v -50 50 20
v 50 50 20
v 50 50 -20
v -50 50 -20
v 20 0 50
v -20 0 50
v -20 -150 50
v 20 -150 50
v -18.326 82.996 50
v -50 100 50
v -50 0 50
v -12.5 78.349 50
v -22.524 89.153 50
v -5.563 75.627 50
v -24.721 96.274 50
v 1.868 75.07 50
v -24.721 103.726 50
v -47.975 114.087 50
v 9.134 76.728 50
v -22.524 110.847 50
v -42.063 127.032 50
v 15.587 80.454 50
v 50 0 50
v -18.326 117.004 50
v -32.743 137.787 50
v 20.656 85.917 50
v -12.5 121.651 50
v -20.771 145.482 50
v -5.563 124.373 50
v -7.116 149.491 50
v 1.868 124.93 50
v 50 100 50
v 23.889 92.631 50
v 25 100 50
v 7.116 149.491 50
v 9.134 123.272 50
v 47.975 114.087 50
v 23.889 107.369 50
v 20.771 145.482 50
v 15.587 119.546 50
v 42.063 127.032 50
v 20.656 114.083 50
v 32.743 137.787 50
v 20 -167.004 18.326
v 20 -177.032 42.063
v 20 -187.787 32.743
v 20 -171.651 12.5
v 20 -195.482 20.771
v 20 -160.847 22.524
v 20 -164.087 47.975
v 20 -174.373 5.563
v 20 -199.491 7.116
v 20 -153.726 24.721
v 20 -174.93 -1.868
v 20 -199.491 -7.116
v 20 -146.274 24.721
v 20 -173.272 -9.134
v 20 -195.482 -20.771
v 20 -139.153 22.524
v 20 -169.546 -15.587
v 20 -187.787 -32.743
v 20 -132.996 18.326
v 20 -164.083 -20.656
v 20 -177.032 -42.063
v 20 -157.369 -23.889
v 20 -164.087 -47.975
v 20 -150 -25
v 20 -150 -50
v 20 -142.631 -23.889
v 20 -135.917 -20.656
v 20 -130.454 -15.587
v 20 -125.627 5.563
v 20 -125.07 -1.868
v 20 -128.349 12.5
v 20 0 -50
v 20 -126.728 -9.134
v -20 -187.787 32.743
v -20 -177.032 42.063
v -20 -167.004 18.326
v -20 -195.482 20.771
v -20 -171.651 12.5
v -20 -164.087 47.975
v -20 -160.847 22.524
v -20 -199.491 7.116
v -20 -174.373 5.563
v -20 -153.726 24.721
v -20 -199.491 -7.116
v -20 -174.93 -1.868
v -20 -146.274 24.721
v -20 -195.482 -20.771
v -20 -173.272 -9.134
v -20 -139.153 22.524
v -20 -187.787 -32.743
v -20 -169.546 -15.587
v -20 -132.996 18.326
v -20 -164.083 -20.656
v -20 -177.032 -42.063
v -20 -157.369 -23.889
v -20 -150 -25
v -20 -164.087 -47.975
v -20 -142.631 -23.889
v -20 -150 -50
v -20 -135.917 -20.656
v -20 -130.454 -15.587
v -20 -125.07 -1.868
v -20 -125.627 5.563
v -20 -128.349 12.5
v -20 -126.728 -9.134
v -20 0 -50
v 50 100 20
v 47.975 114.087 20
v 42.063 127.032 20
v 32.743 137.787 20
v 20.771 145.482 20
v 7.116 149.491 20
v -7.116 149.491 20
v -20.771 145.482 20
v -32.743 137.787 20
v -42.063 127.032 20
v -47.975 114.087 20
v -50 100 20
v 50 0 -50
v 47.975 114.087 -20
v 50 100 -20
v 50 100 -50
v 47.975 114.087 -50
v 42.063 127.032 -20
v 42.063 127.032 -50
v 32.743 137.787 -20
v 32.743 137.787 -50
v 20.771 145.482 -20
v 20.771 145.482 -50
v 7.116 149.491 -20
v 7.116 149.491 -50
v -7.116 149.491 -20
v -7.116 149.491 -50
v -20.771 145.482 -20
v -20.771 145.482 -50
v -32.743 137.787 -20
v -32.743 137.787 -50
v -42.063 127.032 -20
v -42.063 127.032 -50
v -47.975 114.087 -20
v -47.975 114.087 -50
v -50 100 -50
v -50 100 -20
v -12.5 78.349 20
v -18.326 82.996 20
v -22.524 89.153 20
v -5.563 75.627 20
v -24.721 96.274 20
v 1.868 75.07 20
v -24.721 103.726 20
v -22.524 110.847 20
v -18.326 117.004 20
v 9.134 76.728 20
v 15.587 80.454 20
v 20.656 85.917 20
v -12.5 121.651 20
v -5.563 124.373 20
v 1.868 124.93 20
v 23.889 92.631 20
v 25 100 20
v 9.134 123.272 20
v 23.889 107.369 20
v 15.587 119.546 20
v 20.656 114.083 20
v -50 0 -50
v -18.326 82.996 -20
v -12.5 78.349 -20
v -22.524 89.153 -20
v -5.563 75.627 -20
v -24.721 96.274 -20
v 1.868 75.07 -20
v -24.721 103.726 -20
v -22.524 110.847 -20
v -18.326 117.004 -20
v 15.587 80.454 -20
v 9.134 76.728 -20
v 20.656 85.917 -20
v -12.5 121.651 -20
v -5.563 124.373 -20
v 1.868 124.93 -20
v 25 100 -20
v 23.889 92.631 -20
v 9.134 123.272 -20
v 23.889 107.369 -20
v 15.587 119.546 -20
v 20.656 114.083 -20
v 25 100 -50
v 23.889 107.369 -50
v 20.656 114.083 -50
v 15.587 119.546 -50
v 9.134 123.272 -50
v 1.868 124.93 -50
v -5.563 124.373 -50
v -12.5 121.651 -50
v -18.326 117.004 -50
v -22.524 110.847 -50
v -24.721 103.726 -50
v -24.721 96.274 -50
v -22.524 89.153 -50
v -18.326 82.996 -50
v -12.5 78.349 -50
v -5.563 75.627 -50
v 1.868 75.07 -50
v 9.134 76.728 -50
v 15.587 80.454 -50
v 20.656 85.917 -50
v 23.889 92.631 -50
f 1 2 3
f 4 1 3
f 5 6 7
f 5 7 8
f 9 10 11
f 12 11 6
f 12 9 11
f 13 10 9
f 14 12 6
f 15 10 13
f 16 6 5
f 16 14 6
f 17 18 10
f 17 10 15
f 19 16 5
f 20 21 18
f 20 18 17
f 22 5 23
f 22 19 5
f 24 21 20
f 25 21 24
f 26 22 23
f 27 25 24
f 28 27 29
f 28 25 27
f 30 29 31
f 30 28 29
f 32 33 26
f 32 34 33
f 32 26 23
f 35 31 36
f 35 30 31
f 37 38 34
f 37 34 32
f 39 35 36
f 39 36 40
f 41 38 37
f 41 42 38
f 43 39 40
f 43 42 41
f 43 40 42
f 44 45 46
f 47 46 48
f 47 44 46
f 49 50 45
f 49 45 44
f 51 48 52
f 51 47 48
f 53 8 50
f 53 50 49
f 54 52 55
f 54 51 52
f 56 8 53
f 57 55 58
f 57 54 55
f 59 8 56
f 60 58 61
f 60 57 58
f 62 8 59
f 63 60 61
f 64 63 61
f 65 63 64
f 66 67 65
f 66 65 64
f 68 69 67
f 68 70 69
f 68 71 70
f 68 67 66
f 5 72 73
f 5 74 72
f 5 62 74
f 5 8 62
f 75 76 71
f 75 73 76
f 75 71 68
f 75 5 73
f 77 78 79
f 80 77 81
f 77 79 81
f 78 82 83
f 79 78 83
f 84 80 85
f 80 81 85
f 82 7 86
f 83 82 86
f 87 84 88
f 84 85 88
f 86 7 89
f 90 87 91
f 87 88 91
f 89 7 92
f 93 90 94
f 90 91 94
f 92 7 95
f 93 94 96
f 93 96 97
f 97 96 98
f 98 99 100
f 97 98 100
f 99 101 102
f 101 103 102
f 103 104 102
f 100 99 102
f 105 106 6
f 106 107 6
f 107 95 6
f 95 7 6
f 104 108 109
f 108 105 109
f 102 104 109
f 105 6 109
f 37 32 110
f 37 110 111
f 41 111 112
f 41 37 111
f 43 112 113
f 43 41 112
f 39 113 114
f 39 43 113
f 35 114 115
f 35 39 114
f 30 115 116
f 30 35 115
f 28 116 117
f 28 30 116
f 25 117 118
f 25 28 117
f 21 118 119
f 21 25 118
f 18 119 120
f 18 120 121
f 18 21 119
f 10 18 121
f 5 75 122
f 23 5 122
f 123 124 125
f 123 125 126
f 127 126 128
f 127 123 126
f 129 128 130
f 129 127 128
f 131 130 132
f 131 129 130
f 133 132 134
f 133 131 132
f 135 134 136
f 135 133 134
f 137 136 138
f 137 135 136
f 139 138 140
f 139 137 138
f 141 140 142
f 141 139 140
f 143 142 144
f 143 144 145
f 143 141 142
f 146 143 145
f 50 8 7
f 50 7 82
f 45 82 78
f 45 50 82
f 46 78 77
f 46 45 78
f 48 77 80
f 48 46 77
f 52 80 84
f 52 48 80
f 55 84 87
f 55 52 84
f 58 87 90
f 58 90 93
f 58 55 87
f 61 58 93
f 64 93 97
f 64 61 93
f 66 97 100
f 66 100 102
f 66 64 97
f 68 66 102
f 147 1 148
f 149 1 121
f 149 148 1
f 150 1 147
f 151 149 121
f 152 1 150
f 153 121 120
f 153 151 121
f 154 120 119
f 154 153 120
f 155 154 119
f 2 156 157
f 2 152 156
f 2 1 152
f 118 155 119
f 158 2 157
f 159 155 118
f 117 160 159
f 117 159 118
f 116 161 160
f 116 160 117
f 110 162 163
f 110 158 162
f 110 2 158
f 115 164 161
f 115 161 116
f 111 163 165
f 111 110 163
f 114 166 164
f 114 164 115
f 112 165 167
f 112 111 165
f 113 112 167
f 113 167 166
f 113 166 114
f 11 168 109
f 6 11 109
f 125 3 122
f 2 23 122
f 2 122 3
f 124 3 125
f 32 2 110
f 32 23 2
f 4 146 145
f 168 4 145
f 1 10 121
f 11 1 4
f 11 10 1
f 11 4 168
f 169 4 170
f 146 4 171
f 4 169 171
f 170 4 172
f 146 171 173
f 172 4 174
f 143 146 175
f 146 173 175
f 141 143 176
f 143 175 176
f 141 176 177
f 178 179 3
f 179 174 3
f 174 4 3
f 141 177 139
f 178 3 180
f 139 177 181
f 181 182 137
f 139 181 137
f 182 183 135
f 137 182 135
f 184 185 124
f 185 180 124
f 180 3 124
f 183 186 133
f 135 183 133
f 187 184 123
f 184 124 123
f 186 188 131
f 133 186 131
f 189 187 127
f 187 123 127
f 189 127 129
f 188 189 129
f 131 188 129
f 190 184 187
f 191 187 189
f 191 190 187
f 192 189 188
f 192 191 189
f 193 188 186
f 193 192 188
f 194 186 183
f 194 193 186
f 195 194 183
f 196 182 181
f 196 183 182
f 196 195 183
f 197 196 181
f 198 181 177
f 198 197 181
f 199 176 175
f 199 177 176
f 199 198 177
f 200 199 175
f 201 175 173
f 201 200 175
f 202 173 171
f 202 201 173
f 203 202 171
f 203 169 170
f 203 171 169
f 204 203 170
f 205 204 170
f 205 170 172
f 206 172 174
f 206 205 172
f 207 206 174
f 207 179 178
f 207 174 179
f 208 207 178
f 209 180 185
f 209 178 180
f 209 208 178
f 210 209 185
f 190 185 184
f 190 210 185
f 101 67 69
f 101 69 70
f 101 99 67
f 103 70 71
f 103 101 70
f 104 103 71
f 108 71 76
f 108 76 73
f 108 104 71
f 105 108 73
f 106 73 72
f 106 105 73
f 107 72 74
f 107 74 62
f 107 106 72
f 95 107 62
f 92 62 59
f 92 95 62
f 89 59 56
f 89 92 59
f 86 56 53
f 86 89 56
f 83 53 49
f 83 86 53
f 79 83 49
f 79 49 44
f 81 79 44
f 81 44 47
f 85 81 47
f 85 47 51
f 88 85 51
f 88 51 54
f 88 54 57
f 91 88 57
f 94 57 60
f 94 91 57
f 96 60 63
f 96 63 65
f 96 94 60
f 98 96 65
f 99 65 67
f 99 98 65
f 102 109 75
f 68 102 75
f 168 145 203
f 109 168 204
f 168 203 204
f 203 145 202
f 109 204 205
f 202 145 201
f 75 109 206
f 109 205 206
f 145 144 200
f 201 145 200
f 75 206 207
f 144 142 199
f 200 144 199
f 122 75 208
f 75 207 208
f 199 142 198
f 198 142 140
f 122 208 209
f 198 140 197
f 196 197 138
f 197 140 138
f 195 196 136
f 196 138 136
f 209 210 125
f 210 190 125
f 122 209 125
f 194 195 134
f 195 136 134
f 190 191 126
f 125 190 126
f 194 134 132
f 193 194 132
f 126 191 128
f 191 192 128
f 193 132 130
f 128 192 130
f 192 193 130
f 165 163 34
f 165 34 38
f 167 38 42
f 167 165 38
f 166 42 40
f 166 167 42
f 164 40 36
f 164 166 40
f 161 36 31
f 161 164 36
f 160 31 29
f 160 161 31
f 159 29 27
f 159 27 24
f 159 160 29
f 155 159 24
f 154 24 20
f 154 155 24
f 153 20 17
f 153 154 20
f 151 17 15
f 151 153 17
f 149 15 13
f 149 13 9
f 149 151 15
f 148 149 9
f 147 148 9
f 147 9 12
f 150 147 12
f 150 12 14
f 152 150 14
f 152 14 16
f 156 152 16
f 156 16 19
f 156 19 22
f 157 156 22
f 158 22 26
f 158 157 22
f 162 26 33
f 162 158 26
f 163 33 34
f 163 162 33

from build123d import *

# Parameters (mm, degrees)
CROQUIS1_R              = 25
SALIENTE_EXTRUIR1_DEPTH = 50
CORTAR_EXTRUIR1_REACH   = 102
CROQUIS2_W              = 40
CROQUIS2_H              = 100
CROQUIS3_R              = 25
SALIENTE_EXTRUIR2_DEPTH = 20


with BuildPart() as part:
    # Croquis1 → Saliente-Extruir1 (new body, symmetric)
    with BuildSketch(Plane.XY):
        with BuildLine():
            Line((-50, 0), (50, 0))
            Line((50, 0), (50, 100))
            ThreePointArc((50, 100), (0, 150), (-50, 100))
            Line((-50, 100), (-50, 0))
        make_face()
        with Locations((0, 100)):
            Circle(CROQUIS1_R, mode=Mode.SUBTRACT)
    extrude(amount=SALIENTE_EXTRUIR1_DEPTH, both=True)

    # Croquis2 → Cortar-Extruir1 (cut, up to next)
    with BuildSketch(Plane(origin=(50, 0, 0), x_dir=(0, 0, -1), z_dir=(1, 0, 0)), mode=Mode.PRIVATE) as cortar_extruir1_sk1:
        with Locations((0, 100)):
            Rectangle(CROQUIS2_W, CROQUIS2_H)
    cortar_extruir1_tool1 = extrude(cortar_extruir1_sk1.sketch, amount=-CORTAR_EXTRUIR1_REACH, mode=Mode.PRIVATE) & part.part
    add(cortar_extruir1_tool1.solids().sort_by_distance((50, 100, 0))[0], mode=Mode.SUBTRACT)

    # Croquis3 → Saliente-Extruir2 (add, symmetric)
    with BuildSketch(Plane(origin=(0, 0, 0), x_dir=(0, 0, -1), z_dir=(1, 0, 0))):
        with BuildLine():
            Line((-50, 0), (-50, -150))
            ThreePointArc((-50, -150), (0, -200), (50, -150))
            Line((50, -150), (50, 0))
            Line((50, 0), (-50, 0))
        make_face()
        with Locations((0, -150)):
            Circle(CROQUIS3_R, mode=Mode.SUBTRACT)
    extrude(amount=SALIENTE_EXTRUIR2_DEPTH, both=True)


solid = part.part
